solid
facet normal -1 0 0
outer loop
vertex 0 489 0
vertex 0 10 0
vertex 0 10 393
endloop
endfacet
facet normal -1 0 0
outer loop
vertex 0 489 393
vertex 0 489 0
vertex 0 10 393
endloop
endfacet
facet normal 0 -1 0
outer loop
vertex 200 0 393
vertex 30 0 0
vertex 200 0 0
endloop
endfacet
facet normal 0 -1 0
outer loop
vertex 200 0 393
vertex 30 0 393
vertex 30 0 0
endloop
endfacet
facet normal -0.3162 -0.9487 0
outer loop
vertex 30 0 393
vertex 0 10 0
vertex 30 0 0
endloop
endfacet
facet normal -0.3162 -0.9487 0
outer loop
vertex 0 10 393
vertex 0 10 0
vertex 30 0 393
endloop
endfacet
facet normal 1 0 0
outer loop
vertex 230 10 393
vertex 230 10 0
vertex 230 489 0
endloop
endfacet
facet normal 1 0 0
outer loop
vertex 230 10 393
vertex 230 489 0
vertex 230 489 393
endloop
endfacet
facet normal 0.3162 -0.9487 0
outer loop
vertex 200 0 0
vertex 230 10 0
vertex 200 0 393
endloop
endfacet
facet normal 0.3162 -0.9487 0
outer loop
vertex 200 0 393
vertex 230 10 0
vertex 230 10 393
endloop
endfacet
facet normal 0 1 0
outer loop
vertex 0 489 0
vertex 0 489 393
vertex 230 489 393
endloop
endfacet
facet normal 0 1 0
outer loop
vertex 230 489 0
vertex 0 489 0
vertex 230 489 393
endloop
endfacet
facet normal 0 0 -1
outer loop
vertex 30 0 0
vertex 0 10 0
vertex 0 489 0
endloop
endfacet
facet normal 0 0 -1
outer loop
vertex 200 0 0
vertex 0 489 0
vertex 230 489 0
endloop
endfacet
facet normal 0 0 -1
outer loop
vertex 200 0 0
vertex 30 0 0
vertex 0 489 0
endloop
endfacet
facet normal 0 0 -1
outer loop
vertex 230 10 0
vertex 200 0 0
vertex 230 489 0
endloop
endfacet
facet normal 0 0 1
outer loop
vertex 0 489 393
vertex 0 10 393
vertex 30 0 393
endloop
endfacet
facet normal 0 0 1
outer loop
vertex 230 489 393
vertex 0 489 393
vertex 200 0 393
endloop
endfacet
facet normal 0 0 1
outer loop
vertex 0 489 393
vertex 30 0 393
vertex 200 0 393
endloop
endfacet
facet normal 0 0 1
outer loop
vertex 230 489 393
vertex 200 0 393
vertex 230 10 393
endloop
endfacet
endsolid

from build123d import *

# Parameters (mm, degrees)
F0_W     = 230
F0_H     = 393
F1_DEPTH = 489
F2_SIZE2 = 10
F2_SIZE  = 30


with BuildPart() as f1:
    # F0 (on Front) → F1 (new body)
    with BuildSketch(Plane.XZ):
        with Locations((115, 196.5)):
            Rectangle(F0_W, F0_H)
    extrude(amount=-F1_DEPTH)

    # F2
    f2_edges = [f1.edges().sort_by_distance(p)[0] for p in [
        (230, 0, 196.5),
        (0, 0, 196.5),
    ]]
    f2_side = f1.faces().sort_by_distance((115, 0, 196.5))[0]
    chamfer(f2_edges, length=F2_SIZE, length2=F2_SIZE2, reference=f2_side)


solid = f1.part
